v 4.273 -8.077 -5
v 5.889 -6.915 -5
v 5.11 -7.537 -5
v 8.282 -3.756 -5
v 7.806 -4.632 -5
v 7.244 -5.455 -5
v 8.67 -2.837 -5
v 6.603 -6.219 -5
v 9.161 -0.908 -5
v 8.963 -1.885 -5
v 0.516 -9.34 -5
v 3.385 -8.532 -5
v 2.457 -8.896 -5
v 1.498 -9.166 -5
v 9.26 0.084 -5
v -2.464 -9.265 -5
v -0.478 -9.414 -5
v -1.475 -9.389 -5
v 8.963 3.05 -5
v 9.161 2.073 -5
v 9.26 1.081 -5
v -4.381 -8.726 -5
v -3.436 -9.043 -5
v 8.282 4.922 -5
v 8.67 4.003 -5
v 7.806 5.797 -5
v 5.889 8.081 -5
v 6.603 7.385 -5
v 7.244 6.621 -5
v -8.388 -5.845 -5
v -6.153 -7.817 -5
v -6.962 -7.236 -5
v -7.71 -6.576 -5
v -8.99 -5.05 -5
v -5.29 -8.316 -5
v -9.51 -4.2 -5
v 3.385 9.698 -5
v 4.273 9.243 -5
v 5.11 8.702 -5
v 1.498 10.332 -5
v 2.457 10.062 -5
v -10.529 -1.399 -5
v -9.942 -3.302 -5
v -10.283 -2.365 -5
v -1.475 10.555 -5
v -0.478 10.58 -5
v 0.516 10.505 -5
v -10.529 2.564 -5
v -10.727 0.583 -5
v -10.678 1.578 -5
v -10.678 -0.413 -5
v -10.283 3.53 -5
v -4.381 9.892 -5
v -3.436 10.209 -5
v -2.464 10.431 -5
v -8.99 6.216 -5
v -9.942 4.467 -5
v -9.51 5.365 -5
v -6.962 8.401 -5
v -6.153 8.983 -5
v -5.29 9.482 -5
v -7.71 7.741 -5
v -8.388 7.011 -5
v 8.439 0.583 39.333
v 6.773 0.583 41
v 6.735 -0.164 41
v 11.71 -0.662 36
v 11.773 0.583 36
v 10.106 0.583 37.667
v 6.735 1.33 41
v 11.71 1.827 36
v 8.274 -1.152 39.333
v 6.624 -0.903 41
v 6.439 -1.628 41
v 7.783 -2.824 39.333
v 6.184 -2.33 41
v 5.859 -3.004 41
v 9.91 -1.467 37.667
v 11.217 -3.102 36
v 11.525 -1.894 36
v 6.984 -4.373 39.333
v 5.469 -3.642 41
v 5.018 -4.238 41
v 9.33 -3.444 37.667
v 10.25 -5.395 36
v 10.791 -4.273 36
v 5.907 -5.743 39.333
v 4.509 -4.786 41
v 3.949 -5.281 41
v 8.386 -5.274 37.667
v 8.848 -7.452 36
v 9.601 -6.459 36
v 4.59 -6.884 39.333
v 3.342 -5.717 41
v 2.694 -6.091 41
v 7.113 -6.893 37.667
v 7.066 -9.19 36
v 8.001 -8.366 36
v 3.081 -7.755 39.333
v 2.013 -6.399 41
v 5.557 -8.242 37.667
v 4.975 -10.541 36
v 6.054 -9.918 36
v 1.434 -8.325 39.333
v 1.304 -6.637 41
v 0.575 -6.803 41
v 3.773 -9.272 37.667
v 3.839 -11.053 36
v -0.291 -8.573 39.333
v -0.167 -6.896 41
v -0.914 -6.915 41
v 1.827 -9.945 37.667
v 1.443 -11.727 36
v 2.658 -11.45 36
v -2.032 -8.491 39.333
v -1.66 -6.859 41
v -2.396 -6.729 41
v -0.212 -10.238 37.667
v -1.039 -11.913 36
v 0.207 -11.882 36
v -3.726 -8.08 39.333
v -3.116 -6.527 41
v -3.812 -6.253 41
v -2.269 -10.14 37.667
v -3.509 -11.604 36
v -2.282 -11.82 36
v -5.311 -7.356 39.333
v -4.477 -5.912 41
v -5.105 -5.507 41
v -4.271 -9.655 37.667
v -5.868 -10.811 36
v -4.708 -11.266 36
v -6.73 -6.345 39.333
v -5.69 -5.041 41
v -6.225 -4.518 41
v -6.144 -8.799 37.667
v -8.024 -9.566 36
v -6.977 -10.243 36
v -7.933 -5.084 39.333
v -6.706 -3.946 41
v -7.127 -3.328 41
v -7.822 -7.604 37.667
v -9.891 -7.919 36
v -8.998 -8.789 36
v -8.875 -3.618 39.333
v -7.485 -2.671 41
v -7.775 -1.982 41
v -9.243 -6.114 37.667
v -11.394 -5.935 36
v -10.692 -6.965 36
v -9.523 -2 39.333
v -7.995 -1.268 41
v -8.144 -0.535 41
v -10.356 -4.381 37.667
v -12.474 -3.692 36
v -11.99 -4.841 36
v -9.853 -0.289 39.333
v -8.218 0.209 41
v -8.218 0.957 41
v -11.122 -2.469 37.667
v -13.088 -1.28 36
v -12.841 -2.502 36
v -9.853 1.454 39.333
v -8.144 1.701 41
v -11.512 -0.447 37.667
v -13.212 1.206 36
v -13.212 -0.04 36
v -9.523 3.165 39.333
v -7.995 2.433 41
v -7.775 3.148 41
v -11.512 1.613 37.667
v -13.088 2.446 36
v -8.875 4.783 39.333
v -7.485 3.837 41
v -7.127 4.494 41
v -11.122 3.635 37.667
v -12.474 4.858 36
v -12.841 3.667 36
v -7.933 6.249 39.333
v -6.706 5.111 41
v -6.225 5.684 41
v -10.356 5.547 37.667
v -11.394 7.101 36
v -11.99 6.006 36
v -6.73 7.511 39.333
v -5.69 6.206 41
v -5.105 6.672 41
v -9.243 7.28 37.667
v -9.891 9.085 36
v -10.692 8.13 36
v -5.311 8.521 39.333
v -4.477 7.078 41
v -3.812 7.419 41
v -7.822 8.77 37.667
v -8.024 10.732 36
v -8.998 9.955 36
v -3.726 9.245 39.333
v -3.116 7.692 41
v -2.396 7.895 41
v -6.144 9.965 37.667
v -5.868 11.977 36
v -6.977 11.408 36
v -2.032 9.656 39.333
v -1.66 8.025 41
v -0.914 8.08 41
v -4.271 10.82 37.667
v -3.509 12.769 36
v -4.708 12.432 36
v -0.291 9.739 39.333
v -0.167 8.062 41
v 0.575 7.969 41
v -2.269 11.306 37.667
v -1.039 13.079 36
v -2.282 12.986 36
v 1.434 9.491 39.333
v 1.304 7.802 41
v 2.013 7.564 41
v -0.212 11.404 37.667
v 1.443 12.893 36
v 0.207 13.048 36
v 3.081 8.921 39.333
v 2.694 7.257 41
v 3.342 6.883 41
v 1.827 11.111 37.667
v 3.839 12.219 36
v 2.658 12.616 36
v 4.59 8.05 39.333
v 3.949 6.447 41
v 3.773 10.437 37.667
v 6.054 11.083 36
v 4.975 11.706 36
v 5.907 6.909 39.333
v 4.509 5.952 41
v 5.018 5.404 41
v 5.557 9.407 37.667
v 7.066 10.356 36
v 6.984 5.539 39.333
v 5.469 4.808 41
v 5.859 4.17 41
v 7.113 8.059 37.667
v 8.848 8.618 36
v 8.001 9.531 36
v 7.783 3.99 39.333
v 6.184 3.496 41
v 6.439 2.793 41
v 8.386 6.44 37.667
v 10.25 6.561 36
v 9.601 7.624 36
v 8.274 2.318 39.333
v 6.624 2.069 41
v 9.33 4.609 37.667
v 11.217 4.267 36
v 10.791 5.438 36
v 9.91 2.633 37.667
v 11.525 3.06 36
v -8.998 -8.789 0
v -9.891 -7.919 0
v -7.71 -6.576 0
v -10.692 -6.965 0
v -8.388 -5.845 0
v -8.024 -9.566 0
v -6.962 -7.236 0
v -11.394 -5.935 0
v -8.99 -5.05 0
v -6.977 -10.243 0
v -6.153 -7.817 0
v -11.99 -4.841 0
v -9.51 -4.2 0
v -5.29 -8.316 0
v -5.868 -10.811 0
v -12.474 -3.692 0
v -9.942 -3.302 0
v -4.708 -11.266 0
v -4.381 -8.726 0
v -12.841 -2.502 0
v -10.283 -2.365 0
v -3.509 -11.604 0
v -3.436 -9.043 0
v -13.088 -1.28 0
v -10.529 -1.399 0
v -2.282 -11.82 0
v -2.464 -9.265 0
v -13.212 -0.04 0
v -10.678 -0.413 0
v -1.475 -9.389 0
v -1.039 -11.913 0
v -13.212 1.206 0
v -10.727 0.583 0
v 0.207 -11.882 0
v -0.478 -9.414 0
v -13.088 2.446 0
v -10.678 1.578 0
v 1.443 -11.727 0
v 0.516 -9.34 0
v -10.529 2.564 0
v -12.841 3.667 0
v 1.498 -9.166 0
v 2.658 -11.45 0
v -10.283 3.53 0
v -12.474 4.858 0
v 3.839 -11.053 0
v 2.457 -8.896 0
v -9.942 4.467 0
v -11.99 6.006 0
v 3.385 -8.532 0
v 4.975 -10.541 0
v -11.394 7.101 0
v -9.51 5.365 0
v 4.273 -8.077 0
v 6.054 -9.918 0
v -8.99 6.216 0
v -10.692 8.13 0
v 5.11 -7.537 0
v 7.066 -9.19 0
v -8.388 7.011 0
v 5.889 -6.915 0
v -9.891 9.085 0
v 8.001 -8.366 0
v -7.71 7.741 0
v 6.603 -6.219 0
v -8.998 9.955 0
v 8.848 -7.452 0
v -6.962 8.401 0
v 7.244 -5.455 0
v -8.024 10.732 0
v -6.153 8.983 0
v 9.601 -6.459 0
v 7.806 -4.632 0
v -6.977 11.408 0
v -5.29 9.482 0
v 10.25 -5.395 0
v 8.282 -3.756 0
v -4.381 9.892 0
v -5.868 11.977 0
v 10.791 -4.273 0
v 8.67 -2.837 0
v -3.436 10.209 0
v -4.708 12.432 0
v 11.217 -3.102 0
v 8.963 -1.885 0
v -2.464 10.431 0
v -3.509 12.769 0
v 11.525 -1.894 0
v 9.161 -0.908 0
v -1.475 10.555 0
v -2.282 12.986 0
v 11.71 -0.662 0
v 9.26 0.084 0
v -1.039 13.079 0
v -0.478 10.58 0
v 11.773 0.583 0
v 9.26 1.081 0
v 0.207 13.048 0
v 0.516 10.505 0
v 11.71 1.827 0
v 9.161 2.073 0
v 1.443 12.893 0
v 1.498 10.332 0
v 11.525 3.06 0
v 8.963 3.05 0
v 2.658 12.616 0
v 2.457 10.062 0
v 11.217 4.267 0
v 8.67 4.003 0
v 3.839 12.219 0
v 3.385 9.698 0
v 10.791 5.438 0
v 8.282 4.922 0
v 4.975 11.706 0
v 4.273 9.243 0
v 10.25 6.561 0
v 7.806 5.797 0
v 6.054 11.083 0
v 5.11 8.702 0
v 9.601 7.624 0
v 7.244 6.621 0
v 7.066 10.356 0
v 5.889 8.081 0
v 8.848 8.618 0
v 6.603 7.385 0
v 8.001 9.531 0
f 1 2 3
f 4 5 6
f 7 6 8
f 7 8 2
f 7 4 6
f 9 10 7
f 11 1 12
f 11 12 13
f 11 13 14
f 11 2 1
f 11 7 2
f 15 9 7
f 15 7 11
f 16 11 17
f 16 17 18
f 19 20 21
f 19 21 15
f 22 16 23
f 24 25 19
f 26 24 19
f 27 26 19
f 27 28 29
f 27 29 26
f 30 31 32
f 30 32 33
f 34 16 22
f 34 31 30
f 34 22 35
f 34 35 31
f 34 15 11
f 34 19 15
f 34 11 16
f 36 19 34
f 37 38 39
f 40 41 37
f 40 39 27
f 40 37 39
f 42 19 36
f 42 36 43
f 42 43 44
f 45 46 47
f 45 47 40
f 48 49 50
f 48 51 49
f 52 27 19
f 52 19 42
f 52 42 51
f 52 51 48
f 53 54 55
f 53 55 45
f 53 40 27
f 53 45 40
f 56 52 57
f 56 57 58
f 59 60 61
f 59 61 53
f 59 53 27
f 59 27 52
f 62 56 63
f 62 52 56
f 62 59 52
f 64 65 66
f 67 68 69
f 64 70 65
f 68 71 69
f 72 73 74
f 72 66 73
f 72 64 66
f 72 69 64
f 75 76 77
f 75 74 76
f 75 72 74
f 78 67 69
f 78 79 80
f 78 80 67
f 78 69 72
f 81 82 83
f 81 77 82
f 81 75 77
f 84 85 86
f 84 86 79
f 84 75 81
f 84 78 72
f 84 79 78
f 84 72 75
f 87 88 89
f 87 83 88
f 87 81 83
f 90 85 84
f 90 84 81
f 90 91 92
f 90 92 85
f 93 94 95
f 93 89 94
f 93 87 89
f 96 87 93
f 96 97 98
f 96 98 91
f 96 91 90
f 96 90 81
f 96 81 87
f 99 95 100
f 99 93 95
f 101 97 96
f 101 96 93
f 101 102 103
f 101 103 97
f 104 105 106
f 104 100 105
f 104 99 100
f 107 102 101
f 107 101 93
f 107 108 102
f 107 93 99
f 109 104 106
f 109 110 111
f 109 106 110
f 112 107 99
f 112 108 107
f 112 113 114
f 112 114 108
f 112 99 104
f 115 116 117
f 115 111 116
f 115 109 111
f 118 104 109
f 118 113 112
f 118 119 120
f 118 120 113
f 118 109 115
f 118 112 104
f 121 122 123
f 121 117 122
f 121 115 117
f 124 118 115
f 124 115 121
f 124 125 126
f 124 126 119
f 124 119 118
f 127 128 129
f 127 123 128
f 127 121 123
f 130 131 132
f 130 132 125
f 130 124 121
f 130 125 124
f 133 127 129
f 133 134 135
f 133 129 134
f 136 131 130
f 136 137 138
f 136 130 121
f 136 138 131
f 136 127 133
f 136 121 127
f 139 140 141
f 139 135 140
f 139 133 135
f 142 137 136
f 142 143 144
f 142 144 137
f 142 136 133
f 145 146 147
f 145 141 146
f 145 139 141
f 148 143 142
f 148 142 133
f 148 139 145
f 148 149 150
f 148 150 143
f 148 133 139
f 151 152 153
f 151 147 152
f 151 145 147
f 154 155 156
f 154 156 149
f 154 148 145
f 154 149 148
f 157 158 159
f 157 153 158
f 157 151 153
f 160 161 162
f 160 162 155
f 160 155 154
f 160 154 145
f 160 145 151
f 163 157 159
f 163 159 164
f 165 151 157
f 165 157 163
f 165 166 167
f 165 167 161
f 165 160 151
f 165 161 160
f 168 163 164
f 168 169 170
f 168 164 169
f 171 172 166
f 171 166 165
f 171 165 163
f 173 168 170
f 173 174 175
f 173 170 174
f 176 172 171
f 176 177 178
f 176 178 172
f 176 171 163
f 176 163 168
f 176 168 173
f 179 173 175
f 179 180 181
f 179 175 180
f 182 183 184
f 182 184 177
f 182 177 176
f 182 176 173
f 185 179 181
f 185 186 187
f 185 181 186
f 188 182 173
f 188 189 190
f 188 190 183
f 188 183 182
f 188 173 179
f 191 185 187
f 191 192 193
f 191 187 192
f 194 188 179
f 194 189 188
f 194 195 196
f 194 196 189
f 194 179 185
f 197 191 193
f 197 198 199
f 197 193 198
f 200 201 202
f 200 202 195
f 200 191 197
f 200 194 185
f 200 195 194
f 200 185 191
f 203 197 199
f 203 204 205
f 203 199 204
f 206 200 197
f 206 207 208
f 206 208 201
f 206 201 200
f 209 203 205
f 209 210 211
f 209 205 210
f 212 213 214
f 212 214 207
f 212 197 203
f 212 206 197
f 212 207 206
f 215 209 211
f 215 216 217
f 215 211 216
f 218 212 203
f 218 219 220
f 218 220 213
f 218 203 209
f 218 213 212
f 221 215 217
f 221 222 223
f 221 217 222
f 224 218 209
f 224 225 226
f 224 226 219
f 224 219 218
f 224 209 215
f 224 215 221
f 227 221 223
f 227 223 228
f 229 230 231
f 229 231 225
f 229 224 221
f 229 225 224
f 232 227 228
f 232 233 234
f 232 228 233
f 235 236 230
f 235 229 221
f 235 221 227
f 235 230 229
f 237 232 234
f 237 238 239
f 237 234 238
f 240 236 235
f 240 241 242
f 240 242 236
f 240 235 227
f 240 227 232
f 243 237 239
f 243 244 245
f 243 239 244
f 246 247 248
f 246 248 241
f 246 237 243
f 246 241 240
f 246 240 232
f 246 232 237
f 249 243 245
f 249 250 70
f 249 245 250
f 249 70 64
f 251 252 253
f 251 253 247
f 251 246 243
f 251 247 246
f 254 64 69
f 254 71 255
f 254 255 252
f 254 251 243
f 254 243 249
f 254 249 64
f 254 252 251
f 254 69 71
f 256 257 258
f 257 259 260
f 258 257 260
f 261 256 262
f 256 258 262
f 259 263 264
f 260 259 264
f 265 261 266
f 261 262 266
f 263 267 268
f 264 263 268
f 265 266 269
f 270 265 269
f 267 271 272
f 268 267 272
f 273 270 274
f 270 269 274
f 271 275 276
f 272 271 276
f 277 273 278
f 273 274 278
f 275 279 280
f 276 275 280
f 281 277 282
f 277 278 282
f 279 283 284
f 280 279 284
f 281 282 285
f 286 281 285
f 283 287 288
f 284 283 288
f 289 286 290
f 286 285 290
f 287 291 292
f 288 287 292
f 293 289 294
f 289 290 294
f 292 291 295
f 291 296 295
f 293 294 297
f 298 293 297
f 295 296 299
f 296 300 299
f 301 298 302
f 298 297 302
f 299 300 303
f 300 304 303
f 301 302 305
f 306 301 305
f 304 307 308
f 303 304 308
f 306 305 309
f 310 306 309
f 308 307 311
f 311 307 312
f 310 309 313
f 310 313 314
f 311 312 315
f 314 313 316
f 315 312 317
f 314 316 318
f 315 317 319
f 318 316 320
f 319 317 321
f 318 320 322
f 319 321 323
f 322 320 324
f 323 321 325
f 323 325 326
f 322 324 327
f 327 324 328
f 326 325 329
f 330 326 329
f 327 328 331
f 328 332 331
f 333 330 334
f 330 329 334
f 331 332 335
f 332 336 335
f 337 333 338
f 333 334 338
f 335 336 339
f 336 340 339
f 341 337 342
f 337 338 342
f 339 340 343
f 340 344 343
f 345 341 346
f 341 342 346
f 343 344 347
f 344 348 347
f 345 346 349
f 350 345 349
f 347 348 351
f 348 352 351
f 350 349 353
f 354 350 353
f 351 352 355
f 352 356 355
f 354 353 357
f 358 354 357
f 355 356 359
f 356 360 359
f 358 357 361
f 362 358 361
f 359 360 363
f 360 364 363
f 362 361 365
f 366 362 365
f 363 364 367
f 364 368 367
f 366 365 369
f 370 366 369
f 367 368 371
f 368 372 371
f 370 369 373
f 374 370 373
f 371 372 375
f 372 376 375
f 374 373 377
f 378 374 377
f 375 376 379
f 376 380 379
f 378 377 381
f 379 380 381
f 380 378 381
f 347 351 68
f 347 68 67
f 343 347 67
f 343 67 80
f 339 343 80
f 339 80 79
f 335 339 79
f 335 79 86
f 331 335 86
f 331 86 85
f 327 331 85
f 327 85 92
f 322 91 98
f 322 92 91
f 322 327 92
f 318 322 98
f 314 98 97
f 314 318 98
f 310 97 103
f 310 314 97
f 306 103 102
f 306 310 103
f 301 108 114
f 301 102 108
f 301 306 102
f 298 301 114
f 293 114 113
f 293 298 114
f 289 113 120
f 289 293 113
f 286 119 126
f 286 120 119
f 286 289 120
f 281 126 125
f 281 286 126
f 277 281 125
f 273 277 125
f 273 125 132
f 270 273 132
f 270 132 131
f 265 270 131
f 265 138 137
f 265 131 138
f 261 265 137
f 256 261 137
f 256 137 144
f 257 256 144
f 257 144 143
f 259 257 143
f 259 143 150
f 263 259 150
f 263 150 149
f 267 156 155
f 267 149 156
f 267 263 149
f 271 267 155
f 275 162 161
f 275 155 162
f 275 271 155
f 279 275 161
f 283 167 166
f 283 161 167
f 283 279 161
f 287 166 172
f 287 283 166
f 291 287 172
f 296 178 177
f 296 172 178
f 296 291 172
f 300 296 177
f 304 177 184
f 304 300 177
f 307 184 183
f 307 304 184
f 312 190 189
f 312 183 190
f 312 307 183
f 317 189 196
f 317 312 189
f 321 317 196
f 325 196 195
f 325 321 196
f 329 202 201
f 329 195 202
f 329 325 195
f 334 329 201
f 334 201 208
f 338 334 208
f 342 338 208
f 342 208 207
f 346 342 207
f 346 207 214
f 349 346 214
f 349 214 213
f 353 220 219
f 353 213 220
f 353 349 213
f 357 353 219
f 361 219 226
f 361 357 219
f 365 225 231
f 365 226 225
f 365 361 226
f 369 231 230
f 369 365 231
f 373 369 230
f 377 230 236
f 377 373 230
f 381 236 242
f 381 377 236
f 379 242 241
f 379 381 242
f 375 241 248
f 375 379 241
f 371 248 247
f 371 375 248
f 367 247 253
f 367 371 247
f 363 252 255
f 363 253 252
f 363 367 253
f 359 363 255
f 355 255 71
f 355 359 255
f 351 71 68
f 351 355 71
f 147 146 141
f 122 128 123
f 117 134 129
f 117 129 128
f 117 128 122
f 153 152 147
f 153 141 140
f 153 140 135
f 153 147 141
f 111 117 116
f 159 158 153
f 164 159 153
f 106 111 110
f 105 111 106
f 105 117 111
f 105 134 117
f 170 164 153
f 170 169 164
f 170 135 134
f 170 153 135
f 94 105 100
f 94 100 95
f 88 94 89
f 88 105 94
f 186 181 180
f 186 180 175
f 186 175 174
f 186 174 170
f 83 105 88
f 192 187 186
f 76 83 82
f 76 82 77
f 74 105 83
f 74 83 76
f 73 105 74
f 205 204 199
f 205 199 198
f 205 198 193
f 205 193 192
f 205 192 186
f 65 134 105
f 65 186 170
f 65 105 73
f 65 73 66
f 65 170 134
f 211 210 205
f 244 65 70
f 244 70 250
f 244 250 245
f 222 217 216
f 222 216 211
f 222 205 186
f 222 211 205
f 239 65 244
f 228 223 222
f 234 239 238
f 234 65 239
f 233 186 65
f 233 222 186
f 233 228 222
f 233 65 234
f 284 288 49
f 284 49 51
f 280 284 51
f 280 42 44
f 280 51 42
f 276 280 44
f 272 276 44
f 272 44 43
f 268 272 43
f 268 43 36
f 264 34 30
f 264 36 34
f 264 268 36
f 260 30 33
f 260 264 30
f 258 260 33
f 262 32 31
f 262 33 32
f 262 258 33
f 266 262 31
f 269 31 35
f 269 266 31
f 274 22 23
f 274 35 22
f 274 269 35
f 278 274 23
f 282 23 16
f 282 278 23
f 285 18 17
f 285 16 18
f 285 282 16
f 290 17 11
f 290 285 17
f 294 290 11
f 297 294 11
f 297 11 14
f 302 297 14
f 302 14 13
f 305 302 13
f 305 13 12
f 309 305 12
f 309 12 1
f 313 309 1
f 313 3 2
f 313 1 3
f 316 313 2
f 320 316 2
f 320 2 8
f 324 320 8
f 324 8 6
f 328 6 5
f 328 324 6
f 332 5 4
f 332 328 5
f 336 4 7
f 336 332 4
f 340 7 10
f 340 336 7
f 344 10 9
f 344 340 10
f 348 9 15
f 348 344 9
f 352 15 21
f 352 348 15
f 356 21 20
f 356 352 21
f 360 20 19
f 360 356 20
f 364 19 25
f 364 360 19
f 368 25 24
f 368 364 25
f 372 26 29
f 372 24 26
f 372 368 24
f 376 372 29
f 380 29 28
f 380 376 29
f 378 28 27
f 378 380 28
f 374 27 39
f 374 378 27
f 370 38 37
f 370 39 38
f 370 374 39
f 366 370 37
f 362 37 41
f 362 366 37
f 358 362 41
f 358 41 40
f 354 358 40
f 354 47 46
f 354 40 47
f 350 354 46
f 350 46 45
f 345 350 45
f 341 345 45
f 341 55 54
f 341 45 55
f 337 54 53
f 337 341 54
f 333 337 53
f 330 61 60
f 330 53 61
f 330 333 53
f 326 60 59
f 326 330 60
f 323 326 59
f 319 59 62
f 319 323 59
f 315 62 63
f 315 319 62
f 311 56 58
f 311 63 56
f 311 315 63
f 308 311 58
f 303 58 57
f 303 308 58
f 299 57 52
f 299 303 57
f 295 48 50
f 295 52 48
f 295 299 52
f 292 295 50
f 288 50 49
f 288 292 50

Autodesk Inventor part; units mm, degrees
ref_plane "YZ Plane" through (0, 0, 0) normal (1, 0, 0) x (0, 1, 0)
ref_plane "XZ Plane" through (0, 0, 0) normal (0, 1, 0) x (-1, 0, 0)
sketch "Skizze1" plane through (0, 0, 0) normal (0, 0, 1) x (1, 0, 0)
  circle A0 centre (-0.7274, 0.5828) radius 13
  circle A1 centre (-0.7274, 0.5828) radius 12.5
  dimension "d8" = 25
ref_plane "Arbeitsebene1" through (-32.0071, -13.4173, 43.0224) normal (0, 0, 1) x (0.7071, 0.7071, 0)
extrude "Extrusion1" add sketch "Skizze1" along normal blind 41 contours A1
chamfer "Fase1" distance 5 angle 45 1 edges at (-13.2274, 0.5828, 41)
sketch "Sketch2" plane through (-0.7274, 0.5828, 0) normal (0, 0, -1) x (-1, 0, 0)
  circle A0 centre (0, 0) radius 8.6364 projected
  circle A1 centre (0, 0) radius 13.6364 projected
  circle A2 centre (0, 0) radius 13.6364 projected
  circle A3 centre (0, 0) radius 10
  point P0 (-0.7274, -0.5828)
  dimension "d5" = 20
extrude "Extrusion2" add sketch "Sketch2" along normal blind 5 contours A0 | A3
properties part number "00_Microscope_Objective_Lens10x"
